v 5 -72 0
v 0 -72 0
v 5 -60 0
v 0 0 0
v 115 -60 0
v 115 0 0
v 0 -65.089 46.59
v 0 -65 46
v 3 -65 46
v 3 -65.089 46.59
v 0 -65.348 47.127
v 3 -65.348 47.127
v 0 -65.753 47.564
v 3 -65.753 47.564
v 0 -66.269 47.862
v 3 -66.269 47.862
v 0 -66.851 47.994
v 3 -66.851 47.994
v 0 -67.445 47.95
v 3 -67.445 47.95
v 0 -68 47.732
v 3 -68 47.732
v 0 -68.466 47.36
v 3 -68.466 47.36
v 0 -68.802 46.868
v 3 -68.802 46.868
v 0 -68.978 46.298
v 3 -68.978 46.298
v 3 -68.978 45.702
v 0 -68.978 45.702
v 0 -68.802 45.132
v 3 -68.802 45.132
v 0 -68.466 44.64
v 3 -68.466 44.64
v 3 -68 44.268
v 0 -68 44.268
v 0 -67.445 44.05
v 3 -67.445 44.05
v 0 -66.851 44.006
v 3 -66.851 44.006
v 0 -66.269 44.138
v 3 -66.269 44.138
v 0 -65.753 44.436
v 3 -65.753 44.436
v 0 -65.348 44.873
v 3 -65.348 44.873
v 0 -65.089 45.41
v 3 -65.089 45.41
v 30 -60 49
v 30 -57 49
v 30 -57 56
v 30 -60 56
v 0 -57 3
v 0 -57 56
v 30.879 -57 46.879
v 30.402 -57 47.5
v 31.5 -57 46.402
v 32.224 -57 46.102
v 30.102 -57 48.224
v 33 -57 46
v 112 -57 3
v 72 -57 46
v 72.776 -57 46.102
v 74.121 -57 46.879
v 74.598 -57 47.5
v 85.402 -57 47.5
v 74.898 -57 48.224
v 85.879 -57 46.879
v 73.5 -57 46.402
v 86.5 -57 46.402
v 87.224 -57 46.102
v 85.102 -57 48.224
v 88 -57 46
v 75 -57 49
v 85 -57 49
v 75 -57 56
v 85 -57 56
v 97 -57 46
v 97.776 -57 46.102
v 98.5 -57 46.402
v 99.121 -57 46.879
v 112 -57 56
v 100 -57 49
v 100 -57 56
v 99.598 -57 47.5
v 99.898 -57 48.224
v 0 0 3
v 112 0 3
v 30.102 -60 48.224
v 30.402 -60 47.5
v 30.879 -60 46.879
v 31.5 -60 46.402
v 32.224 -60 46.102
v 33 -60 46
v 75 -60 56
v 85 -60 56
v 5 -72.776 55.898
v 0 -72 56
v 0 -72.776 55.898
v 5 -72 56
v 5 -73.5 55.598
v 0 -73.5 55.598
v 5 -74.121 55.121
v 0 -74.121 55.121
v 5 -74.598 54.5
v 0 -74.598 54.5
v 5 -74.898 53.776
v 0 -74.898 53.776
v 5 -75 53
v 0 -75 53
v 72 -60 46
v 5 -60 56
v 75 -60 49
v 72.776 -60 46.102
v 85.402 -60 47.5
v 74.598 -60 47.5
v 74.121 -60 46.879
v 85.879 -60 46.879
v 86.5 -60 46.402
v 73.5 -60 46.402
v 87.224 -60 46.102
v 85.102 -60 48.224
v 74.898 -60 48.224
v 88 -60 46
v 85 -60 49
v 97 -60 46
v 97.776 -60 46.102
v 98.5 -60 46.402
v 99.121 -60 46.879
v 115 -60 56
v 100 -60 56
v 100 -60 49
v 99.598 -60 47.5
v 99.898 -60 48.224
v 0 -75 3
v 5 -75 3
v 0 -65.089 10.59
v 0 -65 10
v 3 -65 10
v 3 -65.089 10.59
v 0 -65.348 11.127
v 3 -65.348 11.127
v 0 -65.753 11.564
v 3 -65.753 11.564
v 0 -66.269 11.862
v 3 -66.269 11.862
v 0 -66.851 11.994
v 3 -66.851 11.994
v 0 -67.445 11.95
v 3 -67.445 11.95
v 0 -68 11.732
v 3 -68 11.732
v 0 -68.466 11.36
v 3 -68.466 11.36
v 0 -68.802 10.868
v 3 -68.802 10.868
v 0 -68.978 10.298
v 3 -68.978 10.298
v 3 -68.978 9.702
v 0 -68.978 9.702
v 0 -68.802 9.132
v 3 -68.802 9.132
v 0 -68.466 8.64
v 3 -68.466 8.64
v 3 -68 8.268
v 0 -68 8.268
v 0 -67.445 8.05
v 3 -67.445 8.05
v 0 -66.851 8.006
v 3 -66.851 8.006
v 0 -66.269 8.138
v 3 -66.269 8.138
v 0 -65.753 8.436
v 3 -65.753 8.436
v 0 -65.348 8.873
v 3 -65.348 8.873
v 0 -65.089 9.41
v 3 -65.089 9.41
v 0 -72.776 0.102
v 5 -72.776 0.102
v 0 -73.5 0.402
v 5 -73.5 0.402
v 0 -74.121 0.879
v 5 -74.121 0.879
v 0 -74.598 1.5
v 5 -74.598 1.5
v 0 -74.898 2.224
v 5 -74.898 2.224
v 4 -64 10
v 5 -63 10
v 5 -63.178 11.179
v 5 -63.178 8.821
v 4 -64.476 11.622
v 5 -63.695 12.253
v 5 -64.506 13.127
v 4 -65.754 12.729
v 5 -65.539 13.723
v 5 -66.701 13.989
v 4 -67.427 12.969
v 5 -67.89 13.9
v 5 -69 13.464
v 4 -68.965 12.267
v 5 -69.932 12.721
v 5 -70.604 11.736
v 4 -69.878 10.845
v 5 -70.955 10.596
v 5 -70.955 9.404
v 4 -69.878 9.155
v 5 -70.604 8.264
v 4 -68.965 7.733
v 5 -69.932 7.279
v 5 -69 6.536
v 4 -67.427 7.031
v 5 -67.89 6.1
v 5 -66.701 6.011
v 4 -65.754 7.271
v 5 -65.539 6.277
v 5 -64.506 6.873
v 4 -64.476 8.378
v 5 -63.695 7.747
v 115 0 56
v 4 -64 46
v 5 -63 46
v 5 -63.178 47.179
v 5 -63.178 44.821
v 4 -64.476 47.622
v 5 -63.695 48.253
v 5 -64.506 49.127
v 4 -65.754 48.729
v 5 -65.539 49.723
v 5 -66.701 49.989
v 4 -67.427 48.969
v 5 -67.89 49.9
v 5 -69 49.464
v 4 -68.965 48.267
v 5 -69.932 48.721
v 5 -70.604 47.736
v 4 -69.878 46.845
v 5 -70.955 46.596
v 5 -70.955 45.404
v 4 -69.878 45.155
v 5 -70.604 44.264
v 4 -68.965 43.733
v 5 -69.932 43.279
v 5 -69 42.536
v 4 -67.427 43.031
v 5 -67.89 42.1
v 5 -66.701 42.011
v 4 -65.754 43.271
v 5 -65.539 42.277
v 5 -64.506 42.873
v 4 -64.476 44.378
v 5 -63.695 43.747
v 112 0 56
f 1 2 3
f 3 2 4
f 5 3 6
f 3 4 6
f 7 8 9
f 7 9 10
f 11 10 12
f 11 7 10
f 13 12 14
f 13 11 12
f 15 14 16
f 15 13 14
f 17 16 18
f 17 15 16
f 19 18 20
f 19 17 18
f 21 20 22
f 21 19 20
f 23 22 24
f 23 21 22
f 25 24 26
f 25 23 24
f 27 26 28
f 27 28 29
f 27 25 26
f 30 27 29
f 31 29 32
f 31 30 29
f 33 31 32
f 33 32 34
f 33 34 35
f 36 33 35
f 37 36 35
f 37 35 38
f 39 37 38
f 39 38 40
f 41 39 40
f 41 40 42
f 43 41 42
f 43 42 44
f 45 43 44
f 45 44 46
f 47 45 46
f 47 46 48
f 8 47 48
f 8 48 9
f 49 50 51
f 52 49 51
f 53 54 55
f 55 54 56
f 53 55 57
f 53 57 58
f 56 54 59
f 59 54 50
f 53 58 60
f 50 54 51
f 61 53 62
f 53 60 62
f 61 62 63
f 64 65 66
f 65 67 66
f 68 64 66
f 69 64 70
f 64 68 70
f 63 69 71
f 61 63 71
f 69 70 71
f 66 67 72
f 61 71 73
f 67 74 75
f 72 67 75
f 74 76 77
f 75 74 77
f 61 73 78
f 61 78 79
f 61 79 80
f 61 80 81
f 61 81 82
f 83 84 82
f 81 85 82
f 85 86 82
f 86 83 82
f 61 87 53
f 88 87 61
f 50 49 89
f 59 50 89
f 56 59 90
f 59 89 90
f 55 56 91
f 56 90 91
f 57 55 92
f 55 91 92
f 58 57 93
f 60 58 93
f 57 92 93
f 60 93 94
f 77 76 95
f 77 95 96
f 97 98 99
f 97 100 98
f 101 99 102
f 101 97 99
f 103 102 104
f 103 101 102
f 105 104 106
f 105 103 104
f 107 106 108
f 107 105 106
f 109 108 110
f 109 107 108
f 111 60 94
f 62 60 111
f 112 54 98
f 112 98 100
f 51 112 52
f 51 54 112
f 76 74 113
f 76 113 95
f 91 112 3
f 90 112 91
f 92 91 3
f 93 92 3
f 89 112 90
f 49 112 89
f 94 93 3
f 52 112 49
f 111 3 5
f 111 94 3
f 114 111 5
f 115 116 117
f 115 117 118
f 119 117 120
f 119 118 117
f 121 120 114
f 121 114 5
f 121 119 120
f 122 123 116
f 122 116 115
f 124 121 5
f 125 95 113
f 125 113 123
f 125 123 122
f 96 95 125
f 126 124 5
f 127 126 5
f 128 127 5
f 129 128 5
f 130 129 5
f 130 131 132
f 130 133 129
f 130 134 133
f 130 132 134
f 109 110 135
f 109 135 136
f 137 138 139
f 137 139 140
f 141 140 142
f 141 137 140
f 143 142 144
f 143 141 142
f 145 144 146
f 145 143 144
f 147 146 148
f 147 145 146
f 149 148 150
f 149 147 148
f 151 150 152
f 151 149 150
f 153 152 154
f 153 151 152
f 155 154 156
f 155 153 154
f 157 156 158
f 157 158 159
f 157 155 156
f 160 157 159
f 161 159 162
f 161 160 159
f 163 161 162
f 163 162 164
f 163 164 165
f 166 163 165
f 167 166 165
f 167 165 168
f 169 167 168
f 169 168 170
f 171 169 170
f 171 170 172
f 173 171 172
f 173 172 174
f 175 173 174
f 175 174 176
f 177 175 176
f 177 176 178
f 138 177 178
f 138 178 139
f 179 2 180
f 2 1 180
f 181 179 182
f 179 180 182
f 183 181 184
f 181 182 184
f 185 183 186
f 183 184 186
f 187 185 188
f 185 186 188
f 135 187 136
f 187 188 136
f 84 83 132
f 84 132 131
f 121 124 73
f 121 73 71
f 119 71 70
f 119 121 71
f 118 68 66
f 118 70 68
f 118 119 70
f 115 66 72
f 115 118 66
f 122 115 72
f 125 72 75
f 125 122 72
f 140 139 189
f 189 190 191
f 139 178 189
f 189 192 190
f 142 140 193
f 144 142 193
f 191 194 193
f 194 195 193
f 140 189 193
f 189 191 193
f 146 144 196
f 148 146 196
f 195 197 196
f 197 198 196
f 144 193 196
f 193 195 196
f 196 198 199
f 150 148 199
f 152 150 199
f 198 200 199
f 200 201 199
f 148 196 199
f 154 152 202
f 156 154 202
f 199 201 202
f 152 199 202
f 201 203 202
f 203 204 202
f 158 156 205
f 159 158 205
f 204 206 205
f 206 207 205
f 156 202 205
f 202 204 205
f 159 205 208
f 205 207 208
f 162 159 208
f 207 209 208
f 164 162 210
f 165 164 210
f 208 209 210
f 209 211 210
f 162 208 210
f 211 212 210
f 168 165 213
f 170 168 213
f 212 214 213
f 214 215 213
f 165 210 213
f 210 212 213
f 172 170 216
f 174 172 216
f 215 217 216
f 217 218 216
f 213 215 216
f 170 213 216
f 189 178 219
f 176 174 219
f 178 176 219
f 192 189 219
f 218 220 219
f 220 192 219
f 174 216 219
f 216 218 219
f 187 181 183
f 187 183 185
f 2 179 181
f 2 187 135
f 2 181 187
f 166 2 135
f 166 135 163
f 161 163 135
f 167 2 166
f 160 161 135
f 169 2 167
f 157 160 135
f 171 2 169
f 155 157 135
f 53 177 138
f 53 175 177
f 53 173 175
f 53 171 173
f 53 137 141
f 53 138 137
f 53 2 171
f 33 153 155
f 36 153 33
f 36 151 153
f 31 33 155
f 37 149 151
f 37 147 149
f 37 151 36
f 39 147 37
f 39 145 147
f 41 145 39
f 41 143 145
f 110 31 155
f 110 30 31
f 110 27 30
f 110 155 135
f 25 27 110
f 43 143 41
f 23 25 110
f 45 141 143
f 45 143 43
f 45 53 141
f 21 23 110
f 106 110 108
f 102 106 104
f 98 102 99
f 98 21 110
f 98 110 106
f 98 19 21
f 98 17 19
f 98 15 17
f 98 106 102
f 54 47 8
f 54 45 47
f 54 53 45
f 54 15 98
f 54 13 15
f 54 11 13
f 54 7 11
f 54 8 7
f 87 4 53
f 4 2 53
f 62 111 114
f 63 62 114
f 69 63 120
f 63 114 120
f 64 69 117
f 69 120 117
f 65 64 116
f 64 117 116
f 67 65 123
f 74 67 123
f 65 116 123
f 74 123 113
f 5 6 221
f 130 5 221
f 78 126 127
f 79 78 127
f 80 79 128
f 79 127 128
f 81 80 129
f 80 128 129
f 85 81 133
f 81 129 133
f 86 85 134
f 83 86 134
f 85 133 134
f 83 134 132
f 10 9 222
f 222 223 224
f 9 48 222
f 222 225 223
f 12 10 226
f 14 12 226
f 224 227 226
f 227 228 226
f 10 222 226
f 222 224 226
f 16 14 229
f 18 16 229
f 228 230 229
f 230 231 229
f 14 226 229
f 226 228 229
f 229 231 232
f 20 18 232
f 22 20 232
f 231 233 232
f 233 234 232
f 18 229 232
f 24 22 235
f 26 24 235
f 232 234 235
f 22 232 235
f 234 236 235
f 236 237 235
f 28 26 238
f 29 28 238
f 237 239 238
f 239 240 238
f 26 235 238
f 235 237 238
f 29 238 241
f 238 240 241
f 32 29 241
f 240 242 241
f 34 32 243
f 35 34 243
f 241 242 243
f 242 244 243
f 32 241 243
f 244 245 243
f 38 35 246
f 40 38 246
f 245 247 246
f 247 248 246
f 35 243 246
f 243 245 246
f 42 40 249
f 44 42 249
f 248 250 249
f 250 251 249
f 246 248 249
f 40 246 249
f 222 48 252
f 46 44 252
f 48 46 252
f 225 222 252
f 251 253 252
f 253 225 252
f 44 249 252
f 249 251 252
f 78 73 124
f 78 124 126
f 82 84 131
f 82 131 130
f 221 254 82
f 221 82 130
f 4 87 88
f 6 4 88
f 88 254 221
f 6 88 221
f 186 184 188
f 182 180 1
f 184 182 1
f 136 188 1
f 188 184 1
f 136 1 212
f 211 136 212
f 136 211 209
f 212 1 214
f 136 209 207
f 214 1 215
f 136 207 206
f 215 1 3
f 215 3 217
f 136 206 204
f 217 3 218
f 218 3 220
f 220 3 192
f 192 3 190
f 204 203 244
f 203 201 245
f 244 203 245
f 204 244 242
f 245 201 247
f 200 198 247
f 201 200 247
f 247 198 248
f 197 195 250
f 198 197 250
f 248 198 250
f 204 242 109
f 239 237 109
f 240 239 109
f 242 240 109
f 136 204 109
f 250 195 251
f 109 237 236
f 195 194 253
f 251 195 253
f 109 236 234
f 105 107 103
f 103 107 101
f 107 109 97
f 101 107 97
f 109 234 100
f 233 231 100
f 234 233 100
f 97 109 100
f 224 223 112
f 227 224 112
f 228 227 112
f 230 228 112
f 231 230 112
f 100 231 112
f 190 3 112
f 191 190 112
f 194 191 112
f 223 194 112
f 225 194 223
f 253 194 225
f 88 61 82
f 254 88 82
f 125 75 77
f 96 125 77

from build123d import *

# Parameters (mm, degrees)
CYLINDER_R            = 2
CYLINDER_DEPTH        = 10
FUSION002_PITCH_ANGLE = 90
FUSION001_PITCH_ANGLE = 90
BOX004_W              = 10
BOX004_H              = 10
BOX004_DEPTH          = 10
BOX003_W              = 70
BOX003_H              = 10
BOX003_DEPTH          = 10
FILLET_R              = 3
BOX001_W              = 112
BOX001_H              = 53
BOX001_DEPTH          = 57
BOX_W                 = 115
BOX_H                 = 56
BOX_DEPTH             = 60
BOX002_W              = 5
BOX002_H              = 56
BOX002_DEPTH          = 15
FILLET001_R           = 3
CUT004_ROLL_ANGLE     = 90


with BuildPart() as cone:
    # Cone → Cone (revolve)
    with BuildSketch(Plane(origin=(0, 0, 10), x_dir=(1, 0, 0), z_dir=(0, -1, 0))):
        Polygon((0, 0), (2, 0), (4, 2), (0, 2), align=None)
    revolve(axis=Axis((0, 0, 10), (0, 0, 1)))


with BuildPart() as cylinder:
    # Cylinder → Cylinder (new body)
    with BuildSketch(Plane.XY):
        Circle(CYLINDER_R)
    extrude(amount=CYLINDER_DEPTH)


with BuildPart() as screw_cutout001:
    # Fusion002 base: copy of Cylinder
    add(cylinder.part)

    # Fusion002: union Cone
    add(cone.part)


with BuildPart() as screw_cutout001_1:
    # Fusion002 pitch: moved
    add(screw_cutout001.part.rotate(Axis((0, 0, 0), (0, 1, 0)), FUSION002_PITCH_ANGLE))


with BuildPart() as screw_cutout001_2:
    # Fusion002 placement: moved
    add(screw_cutout001_1.part.moved(Location((-7, 10, 67))))


with BuildPart() as fusion003:
    # Fusion001 base: copy of Cylinder
    add(cylinder.part)

    # Fusion001: union Cone
    add(cone.part)


with BuildPart() as fusion003_1:
    # Fusion001 pitch: moved
    add(fusion003.part.rotate(Axis((0, 0, 0), (0, 1, 0)), FUSION001_PITCH_ANGLE))


with BuildPart() as fusion003_2:
    # Fusion001 placement: moved
    add(fusion003_1.part.moved(Location((-7, 46, 67))))

    # Fusion003: union screw cutout001
    add(screw_cutout001_2.part)


with BuildPart() as cablecutout001:
    # Box004 → Box004 (new body)
    with BuildSketch(Plane(origin=(75, 46, 51), x_dir=(1, 0, 0), z_dir=(0, 0, 1))):
        with Locations((5, 5)):
            Rectangle(BOX004_W, BOX004_H)
    extrude(amount=BOX004_DEPTH)


with BuildPart() as fillet_body:
    # Box003 → Box003 (new body)
    with BuildSketch(Plane(origin=(30, 46, 51), x_dir=(1, 0, 0), z_dir=(0, 0, 1))):
        with Locations((35, 5)):
            Rectangle(BOX003_W, BOX003_H)
    extrude(amount=BOX003_DEPTH)

    # Cut002: cut cablecutout001
    add(cablecutout001.part, mode=Mode.SUBTRACT)

    # Fillet
    fillet_edges = [fillet_body.edges().sort_by_distance(p)[0] for p in [
        (30, 46, 56),
        (75, 46, 56),
        (100, 46, 56),
        (85, 46, 56),
    ]]
    fillet(fillet_edges, radius=FILLET_R)


with BuildPart() as cube001:
    # Box001 → Box001 (new body)
    with BuildSketch(Plane(origin=(0, 3, 0), x_dir=(1, 0, 0), z_dir=(0, 0, 1))):
        with Locations((56, 26.5)):
            Rectangle(BOX001_W, BOX001_H)
    extrude(amount=BOX001_DEPTH)


with BuildPart() as cut:
    # Box → Box (new body)
    with BuildSketch(Plane.XY):
        with Locations((57.5, 28)):
            Rectangle(BOX_W, BOX_H)
    extrude(amount=BOX_DEPTH)

    # Cut: cut Cube001
    add(cube001.part, mode=Mode.SUBTRACT)


with BuildPart() as cut004:
    # Box002 → Box002 (new body)
    with BuildSketch(Plane.XY.offset(60)):
        with Locations((2.5, 28)):
            Rectangle(BOX002_W, BOX002_H)
    extrude(amount=BOX002_DEPTH)

    # Fillet001
    fillet001_edges = [cut004.edges().sort_by_distance(p)[0] for p in [
        (2.5, 0, 75),
        (2.5, 56, 75),
    ]]
    fillet(fillet001_edges, radius=FILLET001_R)

    # Fusion: union Cut
    add(cut.part)

    # Cut003: cut Fillet body
    add(fillet_body.part, mode=Mode.SUBTRACT)

    # Cut004: cut Fusion003
    add(fusion003_2.part, mode=Mode.SUBTRACT)


with BuildPart() as cut004_1:
    # Cut004 roll: moved
    add(cut004.part.rotate(Axis((0, 0, 0), (1, 0, 0)), CUT004_ROLL_ANGLE))


with BuildPart() as cut004_2:
    # Cut004 placement: moved
    add(cut004_1.part)


solid = cut004_2.part
